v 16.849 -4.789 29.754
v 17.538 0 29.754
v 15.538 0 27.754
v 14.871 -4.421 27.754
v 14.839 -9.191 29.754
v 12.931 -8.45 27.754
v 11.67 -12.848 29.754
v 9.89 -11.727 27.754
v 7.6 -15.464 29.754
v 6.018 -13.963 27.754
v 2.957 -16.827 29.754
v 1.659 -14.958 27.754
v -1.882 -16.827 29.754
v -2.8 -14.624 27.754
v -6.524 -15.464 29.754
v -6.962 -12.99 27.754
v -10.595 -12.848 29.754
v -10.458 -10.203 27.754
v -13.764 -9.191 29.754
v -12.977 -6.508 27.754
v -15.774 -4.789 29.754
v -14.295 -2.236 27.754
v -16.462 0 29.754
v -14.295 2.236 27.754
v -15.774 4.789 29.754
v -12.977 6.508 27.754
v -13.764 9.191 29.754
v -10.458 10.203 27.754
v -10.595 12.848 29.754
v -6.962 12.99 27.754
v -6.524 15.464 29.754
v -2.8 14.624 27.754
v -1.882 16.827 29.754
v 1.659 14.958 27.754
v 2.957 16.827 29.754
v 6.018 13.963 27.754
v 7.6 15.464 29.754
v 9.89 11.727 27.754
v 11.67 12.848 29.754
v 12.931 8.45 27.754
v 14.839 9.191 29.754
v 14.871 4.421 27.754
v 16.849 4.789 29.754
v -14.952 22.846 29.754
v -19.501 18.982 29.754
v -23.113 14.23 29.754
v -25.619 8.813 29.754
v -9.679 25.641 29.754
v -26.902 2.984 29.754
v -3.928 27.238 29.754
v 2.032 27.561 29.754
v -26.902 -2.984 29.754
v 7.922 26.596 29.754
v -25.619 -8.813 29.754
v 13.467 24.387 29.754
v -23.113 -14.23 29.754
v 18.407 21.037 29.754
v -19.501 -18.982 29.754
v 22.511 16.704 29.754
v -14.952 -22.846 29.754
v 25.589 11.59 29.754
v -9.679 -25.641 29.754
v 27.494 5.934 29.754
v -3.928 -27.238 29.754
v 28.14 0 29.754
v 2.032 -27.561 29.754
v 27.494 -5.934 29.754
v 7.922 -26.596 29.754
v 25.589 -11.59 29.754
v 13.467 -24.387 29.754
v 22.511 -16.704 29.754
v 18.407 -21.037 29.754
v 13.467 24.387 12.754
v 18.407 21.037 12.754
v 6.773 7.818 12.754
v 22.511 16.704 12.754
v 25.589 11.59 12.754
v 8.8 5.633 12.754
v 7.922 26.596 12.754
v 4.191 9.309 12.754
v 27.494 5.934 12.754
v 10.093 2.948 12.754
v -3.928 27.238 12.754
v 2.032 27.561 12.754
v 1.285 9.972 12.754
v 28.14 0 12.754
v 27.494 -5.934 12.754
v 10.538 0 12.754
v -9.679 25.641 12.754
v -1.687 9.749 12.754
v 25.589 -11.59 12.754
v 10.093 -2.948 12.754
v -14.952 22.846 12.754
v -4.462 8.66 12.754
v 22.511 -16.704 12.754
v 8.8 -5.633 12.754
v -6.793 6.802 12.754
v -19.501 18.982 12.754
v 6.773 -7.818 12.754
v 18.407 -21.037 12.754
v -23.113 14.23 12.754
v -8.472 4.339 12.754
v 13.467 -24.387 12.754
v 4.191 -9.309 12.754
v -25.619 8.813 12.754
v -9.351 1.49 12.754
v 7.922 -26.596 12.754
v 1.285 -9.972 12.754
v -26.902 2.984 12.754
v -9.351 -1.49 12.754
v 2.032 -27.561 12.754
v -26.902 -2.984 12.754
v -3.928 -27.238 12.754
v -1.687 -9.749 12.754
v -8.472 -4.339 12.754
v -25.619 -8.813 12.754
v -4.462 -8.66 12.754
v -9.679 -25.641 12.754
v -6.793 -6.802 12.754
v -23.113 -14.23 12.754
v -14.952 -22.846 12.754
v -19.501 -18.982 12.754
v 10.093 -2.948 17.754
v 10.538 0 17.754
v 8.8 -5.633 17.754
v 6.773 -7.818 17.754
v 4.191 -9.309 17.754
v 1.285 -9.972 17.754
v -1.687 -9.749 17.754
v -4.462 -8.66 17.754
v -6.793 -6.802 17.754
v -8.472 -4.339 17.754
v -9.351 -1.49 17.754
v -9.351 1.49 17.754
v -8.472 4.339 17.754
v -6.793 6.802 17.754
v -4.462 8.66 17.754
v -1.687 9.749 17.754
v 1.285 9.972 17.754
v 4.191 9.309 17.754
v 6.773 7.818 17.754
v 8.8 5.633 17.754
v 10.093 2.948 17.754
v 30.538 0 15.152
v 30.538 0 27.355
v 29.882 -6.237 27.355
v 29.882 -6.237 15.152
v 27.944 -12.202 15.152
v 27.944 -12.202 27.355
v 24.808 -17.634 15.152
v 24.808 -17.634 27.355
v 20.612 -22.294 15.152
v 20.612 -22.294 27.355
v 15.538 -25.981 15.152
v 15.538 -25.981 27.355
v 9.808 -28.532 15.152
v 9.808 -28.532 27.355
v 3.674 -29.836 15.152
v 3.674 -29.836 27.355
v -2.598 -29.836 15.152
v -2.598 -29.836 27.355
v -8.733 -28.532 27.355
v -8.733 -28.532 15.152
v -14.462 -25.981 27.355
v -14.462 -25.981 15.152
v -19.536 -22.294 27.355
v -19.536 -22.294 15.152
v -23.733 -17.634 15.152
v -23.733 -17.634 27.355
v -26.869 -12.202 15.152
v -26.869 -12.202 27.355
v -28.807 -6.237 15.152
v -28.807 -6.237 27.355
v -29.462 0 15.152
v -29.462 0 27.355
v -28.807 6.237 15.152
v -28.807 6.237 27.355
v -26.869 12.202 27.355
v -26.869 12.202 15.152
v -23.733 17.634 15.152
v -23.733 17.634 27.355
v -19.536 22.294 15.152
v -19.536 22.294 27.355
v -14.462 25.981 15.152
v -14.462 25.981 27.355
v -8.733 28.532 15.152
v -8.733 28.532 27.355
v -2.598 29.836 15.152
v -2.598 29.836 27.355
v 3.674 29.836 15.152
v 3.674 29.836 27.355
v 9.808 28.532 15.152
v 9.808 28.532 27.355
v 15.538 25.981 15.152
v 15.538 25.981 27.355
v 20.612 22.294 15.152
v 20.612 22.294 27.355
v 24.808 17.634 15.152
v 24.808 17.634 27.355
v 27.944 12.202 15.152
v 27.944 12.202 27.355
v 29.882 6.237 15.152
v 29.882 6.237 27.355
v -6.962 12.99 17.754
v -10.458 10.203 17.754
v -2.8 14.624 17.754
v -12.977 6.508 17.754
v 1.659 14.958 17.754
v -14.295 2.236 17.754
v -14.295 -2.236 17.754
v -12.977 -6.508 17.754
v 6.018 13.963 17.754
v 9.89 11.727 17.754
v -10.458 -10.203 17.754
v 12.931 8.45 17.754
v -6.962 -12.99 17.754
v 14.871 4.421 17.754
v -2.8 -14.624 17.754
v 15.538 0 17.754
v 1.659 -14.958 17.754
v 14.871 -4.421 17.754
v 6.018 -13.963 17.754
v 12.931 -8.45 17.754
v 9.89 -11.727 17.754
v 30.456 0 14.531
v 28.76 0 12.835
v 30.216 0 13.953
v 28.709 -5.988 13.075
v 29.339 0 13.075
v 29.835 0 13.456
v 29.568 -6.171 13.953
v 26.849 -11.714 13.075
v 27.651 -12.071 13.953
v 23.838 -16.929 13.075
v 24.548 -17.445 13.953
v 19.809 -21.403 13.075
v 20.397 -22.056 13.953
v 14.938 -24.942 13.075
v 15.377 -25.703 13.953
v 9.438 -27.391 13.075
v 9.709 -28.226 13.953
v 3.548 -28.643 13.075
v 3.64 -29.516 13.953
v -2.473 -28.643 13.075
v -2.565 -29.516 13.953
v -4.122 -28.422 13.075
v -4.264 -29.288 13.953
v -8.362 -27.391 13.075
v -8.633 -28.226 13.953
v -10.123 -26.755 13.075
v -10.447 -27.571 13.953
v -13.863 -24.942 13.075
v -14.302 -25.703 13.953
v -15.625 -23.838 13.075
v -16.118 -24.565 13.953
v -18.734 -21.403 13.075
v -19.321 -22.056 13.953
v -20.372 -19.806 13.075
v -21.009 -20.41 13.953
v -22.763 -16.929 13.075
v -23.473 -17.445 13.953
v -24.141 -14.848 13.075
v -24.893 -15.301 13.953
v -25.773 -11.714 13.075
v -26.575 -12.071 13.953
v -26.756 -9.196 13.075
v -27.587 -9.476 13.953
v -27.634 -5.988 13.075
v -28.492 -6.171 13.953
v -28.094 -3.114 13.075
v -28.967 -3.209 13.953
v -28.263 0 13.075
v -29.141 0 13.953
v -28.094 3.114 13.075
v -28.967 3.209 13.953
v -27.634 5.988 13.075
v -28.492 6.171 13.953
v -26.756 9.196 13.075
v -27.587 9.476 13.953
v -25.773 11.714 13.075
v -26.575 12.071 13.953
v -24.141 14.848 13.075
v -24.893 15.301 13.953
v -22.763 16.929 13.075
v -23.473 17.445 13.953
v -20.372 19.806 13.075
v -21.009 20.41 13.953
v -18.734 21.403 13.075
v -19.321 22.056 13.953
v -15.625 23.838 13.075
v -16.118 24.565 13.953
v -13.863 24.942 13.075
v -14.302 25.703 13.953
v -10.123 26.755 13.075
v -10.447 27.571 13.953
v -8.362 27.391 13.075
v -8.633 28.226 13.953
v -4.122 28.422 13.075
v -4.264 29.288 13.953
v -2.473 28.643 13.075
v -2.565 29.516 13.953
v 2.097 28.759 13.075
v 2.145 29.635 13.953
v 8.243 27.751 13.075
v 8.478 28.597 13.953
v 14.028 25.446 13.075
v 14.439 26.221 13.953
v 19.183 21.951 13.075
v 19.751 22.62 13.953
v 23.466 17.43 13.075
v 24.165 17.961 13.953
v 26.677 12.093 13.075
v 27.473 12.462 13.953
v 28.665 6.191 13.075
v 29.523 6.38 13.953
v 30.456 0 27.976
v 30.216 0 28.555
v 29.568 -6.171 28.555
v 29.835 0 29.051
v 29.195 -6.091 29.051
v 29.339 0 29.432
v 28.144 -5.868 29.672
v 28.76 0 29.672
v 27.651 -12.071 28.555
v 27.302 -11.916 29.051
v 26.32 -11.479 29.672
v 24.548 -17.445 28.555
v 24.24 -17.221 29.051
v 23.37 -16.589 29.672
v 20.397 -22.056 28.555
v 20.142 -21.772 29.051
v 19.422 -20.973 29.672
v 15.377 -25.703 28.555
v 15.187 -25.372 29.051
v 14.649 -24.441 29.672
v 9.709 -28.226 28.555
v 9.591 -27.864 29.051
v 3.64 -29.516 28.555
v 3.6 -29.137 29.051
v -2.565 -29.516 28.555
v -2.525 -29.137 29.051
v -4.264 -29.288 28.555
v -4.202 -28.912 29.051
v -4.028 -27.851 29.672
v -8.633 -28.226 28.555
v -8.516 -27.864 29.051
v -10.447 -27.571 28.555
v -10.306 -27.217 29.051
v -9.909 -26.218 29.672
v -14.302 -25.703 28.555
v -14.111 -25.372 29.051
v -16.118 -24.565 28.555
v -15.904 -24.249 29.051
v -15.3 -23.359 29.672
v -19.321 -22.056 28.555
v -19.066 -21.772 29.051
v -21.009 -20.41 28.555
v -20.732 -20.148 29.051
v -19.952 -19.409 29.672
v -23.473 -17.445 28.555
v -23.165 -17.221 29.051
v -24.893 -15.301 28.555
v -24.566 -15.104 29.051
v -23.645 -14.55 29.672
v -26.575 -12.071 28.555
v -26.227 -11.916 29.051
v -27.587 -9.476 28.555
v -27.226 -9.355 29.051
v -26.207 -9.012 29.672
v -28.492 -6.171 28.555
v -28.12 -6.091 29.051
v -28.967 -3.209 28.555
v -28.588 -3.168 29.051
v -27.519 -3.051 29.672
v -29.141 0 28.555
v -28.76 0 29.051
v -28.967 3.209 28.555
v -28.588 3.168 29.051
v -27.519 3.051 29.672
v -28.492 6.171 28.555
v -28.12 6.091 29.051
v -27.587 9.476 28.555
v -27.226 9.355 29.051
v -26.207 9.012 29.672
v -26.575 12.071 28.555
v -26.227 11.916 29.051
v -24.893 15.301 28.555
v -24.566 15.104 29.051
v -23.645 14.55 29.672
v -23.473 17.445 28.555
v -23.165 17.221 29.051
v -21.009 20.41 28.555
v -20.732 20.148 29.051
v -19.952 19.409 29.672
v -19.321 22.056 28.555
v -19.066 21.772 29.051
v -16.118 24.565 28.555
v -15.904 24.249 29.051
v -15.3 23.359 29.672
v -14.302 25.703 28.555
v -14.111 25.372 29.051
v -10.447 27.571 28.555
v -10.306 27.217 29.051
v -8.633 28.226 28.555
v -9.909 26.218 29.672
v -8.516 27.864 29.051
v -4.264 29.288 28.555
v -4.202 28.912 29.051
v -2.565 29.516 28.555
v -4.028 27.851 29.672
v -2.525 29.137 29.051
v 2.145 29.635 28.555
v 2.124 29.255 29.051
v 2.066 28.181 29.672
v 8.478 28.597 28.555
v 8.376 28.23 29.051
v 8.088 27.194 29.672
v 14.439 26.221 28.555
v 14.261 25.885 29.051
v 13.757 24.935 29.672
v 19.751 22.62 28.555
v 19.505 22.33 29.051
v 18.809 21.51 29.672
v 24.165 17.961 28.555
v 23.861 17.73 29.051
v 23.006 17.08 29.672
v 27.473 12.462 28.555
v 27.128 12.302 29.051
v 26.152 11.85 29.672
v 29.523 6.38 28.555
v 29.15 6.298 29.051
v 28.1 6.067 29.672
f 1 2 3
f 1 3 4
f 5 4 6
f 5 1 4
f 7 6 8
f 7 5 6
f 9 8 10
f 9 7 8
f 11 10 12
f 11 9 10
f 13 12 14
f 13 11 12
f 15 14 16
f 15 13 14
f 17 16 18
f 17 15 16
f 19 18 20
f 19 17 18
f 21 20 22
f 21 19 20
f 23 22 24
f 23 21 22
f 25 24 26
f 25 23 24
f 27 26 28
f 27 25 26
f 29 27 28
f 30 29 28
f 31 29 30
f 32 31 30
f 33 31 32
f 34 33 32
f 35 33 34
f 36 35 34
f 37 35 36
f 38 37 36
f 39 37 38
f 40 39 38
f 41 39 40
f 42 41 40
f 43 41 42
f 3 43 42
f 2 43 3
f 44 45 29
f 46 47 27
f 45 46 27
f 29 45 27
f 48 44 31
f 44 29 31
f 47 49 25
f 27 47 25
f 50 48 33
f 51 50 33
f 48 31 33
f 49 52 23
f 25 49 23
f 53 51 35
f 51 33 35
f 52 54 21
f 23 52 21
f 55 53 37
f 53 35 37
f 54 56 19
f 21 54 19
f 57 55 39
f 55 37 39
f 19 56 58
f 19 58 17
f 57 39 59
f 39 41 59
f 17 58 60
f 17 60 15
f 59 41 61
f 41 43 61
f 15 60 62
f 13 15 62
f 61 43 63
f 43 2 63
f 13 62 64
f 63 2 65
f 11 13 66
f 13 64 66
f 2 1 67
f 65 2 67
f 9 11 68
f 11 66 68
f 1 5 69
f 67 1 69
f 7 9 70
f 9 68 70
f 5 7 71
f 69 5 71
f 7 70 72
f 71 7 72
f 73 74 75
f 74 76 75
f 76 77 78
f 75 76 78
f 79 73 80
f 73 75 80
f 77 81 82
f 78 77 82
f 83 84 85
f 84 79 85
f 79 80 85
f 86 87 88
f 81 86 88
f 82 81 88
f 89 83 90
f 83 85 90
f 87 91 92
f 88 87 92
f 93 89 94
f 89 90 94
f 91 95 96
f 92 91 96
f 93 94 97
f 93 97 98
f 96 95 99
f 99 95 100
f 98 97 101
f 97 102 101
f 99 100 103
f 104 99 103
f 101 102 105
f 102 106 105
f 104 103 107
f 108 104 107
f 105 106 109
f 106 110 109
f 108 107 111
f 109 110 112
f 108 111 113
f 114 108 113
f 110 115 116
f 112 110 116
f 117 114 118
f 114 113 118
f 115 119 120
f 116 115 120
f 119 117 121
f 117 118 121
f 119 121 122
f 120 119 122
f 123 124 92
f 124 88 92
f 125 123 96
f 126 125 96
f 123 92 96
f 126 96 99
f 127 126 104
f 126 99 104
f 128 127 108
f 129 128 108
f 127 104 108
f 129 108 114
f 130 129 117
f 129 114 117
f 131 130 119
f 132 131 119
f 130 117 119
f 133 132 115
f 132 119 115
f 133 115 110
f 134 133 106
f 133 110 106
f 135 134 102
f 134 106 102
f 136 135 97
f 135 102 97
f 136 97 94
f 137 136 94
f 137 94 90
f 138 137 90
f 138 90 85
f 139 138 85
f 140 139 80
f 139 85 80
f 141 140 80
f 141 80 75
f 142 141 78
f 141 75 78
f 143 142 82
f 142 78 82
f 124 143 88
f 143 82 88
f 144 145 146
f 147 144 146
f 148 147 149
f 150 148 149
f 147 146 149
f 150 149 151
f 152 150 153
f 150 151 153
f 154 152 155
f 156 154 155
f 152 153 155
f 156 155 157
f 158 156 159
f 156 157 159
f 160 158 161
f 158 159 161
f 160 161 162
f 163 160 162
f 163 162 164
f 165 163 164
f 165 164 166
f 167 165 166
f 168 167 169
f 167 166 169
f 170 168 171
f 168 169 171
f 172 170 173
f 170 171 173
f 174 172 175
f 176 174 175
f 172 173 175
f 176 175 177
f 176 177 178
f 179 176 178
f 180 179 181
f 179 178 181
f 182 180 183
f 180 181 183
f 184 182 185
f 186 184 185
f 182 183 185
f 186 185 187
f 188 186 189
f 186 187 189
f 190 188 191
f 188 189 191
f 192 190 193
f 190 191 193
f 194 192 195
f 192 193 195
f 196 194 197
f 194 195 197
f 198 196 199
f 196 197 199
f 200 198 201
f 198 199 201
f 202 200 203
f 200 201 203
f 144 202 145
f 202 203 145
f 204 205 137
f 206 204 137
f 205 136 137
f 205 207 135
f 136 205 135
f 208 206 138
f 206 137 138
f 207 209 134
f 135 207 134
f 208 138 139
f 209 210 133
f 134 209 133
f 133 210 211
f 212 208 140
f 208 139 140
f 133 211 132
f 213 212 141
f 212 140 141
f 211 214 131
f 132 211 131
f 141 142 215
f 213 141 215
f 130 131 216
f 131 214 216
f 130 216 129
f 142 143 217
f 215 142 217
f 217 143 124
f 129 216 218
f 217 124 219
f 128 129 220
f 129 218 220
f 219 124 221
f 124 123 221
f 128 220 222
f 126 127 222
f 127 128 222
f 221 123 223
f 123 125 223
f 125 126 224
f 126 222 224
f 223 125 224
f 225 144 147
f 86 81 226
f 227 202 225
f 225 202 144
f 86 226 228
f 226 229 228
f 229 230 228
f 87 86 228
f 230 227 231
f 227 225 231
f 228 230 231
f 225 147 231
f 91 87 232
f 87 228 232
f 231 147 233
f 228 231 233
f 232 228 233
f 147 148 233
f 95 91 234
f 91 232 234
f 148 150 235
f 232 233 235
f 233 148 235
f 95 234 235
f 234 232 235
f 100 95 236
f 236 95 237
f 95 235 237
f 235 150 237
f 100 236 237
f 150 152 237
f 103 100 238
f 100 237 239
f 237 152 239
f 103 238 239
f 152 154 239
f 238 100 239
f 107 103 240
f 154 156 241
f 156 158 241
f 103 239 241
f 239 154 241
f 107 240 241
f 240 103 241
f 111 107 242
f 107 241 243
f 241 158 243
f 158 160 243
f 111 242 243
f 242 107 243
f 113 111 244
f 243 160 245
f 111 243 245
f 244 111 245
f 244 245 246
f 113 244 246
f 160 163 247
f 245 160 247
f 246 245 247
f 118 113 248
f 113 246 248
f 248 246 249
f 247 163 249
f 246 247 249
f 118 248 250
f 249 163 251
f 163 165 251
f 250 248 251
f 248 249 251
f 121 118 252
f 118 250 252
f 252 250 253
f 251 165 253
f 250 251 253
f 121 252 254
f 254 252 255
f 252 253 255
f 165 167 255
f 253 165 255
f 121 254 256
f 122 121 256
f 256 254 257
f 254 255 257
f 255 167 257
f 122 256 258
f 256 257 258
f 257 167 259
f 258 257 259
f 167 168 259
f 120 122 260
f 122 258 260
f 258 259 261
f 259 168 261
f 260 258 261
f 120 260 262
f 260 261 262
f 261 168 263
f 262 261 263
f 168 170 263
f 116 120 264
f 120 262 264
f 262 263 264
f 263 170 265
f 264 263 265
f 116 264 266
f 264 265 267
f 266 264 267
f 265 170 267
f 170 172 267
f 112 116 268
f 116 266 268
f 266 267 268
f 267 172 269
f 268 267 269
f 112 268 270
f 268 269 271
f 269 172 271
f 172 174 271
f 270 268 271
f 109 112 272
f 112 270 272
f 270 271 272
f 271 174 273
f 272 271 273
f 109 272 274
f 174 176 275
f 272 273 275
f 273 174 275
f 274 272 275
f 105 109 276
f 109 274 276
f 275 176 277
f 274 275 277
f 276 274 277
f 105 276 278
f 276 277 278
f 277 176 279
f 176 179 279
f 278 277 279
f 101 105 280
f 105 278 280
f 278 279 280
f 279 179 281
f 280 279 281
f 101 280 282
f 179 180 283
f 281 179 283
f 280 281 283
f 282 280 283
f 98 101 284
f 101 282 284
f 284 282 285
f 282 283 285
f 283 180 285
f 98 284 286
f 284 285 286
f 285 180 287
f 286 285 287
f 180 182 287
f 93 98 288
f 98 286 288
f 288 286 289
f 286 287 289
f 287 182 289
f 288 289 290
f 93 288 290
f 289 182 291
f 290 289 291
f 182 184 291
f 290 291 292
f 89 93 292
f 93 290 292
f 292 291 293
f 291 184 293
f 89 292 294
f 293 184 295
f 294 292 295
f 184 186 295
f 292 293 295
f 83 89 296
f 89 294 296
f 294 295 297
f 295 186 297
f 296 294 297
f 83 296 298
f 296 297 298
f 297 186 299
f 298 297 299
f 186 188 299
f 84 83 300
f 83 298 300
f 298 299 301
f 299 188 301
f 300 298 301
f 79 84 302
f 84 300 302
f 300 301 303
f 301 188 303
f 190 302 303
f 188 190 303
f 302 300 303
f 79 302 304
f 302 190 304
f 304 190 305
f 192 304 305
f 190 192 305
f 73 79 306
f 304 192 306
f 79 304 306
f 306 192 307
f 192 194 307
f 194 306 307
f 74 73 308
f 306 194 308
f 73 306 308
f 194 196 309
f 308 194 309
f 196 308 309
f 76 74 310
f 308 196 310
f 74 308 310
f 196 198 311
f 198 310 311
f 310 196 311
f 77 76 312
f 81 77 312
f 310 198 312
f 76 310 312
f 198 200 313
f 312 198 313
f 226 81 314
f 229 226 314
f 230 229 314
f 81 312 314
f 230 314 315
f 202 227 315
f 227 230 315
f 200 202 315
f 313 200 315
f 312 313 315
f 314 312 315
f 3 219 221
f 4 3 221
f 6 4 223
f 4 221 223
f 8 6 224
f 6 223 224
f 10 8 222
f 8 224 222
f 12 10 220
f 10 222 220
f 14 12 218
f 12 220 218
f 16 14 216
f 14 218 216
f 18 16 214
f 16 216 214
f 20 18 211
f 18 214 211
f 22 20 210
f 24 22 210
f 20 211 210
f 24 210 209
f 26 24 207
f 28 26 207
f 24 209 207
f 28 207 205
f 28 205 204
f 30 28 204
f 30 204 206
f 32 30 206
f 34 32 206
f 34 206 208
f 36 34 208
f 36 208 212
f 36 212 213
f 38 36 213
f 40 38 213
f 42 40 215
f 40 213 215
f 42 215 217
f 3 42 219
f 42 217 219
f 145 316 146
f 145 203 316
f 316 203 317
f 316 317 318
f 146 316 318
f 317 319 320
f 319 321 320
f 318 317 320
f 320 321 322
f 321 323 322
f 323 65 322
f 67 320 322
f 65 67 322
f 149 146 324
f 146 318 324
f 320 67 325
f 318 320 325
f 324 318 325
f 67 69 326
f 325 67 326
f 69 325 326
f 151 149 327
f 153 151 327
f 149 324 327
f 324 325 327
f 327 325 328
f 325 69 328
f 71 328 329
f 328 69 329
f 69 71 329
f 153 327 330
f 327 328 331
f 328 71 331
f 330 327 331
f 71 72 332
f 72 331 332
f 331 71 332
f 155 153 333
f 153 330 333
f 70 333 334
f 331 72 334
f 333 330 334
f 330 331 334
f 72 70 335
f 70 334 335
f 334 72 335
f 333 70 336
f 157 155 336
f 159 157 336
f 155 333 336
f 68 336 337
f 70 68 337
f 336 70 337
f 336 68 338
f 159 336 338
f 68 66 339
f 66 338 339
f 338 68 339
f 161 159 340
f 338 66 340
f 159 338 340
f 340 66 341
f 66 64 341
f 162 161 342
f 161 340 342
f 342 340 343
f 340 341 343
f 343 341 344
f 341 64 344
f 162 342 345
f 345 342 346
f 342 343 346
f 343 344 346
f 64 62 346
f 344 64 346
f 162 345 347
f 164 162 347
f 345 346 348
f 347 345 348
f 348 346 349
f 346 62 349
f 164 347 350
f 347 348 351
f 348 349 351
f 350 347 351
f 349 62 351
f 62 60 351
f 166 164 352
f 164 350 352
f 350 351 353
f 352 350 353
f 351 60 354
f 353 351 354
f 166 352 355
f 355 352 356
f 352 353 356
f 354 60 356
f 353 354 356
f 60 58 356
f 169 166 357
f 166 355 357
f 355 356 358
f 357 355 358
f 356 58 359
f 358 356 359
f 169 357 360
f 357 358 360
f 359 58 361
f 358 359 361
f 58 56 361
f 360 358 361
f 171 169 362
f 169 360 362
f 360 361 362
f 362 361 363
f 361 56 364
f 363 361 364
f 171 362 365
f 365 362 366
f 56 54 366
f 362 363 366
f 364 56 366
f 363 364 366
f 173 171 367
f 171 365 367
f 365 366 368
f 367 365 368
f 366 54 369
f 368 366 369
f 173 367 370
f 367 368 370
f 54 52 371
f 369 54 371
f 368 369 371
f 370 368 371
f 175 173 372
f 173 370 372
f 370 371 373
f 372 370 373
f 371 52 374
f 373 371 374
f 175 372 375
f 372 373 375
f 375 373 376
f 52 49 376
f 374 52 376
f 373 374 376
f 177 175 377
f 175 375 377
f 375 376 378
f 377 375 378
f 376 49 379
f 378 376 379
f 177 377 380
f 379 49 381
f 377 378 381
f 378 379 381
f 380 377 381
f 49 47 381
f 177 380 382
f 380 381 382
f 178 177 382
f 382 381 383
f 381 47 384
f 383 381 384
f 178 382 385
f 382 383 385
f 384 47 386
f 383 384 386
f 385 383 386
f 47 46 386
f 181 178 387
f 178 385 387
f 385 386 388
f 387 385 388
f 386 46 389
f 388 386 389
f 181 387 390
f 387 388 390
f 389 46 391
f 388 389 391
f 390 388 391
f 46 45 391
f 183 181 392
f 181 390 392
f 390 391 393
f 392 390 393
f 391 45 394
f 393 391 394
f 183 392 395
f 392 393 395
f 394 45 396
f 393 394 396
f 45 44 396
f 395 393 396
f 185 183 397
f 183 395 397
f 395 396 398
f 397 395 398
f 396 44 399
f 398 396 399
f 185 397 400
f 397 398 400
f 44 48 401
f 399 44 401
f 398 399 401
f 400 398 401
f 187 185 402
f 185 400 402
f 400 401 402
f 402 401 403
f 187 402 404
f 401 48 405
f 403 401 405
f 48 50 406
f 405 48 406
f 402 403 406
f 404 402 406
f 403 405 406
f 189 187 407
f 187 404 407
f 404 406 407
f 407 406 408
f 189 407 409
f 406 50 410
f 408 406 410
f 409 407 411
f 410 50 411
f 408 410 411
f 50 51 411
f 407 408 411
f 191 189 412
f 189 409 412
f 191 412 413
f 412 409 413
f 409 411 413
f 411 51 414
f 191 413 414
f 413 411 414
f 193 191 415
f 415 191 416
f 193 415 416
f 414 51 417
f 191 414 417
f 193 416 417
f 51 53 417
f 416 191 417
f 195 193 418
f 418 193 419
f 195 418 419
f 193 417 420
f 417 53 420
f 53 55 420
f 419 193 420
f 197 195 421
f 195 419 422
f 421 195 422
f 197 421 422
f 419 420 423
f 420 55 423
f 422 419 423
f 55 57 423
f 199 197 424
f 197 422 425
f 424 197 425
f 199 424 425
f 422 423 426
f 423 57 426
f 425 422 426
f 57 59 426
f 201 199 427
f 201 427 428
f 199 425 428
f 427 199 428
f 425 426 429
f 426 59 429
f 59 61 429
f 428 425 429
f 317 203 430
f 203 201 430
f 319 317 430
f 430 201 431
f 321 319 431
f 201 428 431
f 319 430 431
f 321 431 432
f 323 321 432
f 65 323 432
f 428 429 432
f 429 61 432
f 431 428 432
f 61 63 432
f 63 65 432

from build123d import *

# Parameters (mm, degrees)
F2_R    = 2.3981299458
F3_SIZE = 2


with BuildPart() as f1:
    # F0 (on Front) → F1 (revolve)
    with BuildSketch(Plane.XZ):
        Polygon((15.5377323945, 17.7536051821), (10.5377323945, 17.7536051821), (10.5377323945, 12.7536051821), (30.5377323945, 12.7536051821), (30.5377323945, 29.7536051821), (15.5377323945, 29.7536051821), align=None)
    revolve(axis=Axis((0.5377323945, 0, 22.511664778), (0, 0, -1)))

    # F2
    f2_edges = [f1.edges().sort_by_distance(p)[0] for p in [
        (-29.462268, 0, 29.753605),
        (-29.462268, 0, 12.753605),
    ]]
    fillet(f2_edges, radius=F2_R)

    # F3
    f3_edges = [f1.edges().sort_by_distance(p)[0] for p in [
        (-14.462268, 0, 29.753605),
    ]]
    chamfer(f3_edges, length=F3_SIZE)


solid = f1.part
